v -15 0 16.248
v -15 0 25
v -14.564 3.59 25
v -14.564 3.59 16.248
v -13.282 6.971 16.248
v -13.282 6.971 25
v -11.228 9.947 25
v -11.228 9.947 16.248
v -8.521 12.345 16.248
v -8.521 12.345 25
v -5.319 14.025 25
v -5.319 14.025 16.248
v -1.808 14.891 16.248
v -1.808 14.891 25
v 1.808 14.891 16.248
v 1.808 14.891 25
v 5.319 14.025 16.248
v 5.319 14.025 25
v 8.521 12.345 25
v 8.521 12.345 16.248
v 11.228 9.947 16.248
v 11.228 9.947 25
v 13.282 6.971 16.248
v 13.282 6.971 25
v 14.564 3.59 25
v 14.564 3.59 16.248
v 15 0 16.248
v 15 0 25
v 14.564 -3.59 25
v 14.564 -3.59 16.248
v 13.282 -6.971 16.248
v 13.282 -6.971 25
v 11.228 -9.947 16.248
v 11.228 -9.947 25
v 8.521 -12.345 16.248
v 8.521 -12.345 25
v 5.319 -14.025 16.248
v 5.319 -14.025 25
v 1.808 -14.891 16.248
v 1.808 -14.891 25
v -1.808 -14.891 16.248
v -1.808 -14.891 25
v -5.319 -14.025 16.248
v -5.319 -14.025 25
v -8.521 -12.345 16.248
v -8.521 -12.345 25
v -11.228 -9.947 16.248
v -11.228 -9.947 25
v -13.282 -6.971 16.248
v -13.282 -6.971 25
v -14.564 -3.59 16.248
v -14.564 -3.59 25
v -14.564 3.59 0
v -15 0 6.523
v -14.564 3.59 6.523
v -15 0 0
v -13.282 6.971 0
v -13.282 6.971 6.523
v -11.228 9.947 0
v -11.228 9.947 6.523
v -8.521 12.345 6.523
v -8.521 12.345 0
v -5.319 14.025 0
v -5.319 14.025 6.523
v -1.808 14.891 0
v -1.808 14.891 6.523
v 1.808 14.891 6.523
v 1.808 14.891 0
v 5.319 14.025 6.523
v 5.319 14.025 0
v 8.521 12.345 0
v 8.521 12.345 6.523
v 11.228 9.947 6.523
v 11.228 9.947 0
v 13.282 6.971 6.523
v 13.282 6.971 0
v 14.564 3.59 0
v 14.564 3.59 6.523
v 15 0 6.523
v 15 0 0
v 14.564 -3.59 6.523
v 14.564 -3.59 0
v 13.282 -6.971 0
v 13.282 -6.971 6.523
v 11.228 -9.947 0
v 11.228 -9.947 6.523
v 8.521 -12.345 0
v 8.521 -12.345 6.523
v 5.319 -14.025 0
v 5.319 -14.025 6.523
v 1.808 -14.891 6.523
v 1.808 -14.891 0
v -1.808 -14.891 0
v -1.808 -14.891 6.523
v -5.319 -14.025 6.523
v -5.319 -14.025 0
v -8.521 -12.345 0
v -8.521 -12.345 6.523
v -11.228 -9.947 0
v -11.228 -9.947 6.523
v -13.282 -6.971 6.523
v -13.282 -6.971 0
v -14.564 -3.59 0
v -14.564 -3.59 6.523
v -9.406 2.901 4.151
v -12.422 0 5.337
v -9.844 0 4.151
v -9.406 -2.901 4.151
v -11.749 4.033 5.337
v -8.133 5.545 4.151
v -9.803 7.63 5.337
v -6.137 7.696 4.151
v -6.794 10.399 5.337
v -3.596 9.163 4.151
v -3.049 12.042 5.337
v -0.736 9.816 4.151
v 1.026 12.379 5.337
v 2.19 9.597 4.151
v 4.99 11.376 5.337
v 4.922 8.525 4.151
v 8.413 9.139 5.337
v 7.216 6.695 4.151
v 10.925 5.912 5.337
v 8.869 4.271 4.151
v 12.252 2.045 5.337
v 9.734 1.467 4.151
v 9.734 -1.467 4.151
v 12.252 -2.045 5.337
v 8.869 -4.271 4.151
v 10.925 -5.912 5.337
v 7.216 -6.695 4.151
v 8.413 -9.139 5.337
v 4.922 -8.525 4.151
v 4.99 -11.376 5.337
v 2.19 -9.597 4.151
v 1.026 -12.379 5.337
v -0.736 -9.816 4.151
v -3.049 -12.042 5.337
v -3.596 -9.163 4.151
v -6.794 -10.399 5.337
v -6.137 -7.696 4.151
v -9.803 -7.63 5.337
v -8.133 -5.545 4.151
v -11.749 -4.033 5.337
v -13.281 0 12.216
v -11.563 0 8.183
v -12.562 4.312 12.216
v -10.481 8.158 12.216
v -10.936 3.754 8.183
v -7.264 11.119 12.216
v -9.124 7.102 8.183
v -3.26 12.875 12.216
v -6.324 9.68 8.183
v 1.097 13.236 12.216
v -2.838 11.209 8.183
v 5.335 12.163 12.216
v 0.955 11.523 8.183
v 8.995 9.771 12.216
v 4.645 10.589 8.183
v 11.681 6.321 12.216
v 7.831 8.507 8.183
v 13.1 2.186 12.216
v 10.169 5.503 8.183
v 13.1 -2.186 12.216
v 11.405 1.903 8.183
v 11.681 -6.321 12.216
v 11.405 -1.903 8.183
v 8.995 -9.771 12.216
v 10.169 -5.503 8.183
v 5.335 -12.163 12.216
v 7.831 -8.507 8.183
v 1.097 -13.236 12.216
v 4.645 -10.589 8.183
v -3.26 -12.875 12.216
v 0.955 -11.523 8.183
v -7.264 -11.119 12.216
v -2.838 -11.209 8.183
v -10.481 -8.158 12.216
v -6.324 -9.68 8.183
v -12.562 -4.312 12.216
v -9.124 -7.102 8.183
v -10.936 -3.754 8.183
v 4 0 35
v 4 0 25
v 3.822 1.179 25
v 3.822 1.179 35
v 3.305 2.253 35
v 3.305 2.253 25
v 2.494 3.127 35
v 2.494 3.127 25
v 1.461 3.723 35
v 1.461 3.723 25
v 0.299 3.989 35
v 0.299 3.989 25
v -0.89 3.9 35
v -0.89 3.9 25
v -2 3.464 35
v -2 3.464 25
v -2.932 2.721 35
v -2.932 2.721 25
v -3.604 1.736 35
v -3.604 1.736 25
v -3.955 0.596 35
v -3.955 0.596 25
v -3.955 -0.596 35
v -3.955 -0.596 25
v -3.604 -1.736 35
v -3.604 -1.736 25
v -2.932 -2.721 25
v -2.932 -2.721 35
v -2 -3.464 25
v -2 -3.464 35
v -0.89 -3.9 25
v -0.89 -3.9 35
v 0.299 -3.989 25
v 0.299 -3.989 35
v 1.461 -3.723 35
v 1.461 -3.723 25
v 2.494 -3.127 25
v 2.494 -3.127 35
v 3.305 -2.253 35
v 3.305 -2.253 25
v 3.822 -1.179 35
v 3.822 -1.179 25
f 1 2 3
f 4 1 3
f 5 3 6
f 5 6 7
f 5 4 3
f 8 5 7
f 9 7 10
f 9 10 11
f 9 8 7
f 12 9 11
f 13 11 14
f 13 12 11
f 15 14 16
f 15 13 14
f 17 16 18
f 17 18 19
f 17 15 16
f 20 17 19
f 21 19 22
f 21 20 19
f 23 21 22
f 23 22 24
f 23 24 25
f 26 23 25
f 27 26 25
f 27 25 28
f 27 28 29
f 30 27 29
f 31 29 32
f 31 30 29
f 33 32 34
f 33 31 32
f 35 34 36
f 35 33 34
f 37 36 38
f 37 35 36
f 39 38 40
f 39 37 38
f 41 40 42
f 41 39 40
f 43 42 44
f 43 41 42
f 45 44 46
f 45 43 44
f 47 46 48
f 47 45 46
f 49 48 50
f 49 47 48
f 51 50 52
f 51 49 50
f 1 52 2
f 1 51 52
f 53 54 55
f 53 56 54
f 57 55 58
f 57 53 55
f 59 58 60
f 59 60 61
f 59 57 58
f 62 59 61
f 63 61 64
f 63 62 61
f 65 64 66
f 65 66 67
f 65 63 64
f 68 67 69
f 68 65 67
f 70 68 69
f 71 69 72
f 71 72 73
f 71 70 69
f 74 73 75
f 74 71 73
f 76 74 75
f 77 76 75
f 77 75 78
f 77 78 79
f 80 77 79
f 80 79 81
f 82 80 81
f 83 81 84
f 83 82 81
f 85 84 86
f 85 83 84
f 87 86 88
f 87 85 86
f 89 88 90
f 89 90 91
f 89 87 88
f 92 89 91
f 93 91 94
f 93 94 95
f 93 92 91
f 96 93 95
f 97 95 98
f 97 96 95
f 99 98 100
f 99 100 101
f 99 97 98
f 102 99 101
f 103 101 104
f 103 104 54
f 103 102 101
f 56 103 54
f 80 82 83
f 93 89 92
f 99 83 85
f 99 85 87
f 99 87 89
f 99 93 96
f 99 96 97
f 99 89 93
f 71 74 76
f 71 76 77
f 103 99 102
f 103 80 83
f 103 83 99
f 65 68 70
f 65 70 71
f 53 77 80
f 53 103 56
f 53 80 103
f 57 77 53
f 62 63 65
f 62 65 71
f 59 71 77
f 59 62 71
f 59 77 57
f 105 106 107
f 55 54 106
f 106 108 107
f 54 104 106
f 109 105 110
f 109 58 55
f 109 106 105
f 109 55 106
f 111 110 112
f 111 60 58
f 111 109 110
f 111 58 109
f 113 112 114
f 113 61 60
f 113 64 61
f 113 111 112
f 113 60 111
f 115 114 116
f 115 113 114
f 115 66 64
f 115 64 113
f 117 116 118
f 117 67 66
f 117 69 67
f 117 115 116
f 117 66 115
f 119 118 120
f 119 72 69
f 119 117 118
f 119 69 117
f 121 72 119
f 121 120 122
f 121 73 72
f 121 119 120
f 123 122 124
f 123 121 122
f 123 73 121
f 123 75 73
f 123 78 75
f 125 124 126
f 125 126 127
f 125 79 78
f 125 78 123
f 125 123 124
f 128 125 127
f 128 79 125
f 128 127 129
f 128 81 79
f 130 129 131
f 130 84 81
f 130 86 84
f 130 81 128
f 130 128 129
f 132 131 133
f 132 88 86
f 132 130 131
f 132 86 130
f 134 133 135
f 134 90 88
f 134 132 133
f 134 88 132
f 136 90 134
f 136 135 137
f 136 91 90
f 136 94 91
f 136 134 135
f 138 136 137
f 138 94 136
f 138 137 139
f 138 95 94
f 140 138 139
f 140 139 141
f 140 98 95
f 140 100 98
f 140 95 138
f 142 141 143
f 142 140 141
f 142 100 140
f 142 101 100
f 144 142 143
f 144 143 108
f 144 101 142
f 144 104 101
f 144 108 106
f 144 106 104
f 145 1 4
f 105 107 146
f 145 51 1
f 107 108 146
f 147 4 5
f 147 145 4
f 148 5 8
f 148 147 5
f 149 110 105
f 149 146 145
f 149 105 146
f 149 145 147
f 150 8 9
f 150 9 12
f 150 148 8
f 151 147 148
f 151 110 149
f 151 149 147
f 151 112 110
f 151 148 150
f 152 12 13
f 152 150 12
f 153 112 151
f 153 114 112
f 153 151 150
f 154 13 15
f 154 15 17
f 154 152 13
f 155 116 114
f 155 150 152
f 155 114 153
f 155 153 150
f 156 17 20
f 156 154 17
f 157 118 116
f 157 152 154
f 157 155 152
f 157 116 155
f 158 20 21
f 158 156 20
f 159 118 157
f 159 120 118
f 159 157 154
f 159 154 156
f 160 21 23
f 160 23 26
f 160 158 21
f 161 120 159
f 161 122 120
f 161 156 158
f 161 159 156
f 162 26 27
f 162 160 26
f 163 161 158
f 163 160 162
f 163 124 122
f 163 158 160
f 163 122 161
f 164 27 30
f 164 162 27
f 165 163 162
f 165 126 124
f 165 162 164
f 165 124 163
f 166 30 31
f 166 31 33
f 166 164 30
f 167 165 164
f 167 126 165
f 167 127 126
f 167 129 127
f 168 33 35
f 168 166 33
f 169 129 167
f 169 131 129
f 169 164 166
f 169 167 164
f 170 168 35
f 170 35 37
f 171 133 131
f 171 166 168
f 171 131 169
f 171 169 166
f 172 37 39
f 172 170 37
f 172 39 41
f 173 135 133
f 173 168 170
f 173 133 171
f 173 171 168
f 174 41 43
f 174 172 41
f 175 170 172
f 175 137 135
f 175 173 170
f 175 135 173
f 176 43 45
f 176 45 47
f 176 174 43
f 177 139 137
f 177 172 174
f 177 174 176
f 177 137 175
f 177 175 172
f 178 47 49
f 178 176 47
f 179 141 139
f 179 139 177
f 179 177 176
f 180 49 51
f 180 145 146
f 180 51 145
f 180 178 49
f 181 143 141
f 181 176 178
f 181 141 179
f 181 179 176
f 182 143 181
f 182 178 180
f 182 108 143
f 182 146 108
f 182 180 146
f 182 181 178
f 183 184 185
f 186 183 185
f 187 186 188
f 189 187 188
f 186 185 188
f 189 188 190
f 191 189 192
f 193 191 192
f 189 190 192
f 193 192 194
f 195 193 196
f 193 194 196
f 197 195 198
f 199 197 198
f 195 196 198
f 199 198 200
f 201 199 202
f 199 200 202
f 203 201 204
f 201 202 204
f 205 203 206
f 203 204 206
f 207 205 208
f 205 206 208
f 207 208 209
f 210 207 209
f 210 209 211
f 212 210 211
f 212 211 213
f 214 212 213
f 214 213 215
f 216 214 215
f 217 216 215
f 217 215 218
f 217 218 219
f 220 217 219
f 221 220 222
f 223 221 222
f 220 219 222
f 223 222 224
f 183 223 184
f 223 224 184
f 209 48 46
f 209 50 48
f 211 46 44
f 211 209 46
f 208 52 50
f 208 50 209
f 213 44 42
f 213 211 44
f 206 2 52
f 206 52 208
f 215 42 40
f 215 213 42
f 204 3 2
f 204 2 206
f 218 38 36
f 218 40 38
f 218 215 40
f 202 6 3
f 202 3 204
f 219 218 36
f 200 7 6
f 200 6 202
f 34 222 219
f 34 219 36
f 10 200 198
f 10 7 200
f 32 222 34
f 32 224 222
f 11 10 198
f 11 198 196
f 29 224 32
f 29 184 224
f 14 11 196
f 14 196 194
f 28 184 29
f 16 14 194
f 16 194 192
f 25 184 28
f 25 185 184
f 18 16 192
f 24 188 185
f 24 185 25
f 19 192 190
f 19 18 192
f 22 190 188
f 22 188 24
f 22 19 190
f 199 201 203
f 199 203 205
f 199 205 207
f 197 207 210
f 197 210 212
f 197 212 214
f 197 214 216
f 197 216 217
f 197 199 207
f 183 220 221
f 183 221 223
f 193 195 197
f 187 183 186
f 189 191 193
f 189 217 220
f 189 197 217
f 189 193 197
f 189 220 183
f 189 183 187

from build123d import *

# Parameters (mm, degrees)
F2_R     = 4
F3_DEPTH = 10


with BuildPart() as f1:
    # F0 (on Front) → F1 (revolve)
    with BuildSketch(Plane.XZ):
        Polygon((0, 0), (0, 25), (-15, 25), (-15, 16.248118), (-9.843752, 4.150979), (-15, 6.522967), (-15, 0), align=None)
    revolve(axis=Axis((0, 0, 12.5), (0, 0, -1)))

    # F2 (on face) → F3 (join)
    with BuildSketch(Plane.XY.offset(25)):
        Circle(F2_R)
    extrude(amount=F3_DEPTH)


solid = f1.part
